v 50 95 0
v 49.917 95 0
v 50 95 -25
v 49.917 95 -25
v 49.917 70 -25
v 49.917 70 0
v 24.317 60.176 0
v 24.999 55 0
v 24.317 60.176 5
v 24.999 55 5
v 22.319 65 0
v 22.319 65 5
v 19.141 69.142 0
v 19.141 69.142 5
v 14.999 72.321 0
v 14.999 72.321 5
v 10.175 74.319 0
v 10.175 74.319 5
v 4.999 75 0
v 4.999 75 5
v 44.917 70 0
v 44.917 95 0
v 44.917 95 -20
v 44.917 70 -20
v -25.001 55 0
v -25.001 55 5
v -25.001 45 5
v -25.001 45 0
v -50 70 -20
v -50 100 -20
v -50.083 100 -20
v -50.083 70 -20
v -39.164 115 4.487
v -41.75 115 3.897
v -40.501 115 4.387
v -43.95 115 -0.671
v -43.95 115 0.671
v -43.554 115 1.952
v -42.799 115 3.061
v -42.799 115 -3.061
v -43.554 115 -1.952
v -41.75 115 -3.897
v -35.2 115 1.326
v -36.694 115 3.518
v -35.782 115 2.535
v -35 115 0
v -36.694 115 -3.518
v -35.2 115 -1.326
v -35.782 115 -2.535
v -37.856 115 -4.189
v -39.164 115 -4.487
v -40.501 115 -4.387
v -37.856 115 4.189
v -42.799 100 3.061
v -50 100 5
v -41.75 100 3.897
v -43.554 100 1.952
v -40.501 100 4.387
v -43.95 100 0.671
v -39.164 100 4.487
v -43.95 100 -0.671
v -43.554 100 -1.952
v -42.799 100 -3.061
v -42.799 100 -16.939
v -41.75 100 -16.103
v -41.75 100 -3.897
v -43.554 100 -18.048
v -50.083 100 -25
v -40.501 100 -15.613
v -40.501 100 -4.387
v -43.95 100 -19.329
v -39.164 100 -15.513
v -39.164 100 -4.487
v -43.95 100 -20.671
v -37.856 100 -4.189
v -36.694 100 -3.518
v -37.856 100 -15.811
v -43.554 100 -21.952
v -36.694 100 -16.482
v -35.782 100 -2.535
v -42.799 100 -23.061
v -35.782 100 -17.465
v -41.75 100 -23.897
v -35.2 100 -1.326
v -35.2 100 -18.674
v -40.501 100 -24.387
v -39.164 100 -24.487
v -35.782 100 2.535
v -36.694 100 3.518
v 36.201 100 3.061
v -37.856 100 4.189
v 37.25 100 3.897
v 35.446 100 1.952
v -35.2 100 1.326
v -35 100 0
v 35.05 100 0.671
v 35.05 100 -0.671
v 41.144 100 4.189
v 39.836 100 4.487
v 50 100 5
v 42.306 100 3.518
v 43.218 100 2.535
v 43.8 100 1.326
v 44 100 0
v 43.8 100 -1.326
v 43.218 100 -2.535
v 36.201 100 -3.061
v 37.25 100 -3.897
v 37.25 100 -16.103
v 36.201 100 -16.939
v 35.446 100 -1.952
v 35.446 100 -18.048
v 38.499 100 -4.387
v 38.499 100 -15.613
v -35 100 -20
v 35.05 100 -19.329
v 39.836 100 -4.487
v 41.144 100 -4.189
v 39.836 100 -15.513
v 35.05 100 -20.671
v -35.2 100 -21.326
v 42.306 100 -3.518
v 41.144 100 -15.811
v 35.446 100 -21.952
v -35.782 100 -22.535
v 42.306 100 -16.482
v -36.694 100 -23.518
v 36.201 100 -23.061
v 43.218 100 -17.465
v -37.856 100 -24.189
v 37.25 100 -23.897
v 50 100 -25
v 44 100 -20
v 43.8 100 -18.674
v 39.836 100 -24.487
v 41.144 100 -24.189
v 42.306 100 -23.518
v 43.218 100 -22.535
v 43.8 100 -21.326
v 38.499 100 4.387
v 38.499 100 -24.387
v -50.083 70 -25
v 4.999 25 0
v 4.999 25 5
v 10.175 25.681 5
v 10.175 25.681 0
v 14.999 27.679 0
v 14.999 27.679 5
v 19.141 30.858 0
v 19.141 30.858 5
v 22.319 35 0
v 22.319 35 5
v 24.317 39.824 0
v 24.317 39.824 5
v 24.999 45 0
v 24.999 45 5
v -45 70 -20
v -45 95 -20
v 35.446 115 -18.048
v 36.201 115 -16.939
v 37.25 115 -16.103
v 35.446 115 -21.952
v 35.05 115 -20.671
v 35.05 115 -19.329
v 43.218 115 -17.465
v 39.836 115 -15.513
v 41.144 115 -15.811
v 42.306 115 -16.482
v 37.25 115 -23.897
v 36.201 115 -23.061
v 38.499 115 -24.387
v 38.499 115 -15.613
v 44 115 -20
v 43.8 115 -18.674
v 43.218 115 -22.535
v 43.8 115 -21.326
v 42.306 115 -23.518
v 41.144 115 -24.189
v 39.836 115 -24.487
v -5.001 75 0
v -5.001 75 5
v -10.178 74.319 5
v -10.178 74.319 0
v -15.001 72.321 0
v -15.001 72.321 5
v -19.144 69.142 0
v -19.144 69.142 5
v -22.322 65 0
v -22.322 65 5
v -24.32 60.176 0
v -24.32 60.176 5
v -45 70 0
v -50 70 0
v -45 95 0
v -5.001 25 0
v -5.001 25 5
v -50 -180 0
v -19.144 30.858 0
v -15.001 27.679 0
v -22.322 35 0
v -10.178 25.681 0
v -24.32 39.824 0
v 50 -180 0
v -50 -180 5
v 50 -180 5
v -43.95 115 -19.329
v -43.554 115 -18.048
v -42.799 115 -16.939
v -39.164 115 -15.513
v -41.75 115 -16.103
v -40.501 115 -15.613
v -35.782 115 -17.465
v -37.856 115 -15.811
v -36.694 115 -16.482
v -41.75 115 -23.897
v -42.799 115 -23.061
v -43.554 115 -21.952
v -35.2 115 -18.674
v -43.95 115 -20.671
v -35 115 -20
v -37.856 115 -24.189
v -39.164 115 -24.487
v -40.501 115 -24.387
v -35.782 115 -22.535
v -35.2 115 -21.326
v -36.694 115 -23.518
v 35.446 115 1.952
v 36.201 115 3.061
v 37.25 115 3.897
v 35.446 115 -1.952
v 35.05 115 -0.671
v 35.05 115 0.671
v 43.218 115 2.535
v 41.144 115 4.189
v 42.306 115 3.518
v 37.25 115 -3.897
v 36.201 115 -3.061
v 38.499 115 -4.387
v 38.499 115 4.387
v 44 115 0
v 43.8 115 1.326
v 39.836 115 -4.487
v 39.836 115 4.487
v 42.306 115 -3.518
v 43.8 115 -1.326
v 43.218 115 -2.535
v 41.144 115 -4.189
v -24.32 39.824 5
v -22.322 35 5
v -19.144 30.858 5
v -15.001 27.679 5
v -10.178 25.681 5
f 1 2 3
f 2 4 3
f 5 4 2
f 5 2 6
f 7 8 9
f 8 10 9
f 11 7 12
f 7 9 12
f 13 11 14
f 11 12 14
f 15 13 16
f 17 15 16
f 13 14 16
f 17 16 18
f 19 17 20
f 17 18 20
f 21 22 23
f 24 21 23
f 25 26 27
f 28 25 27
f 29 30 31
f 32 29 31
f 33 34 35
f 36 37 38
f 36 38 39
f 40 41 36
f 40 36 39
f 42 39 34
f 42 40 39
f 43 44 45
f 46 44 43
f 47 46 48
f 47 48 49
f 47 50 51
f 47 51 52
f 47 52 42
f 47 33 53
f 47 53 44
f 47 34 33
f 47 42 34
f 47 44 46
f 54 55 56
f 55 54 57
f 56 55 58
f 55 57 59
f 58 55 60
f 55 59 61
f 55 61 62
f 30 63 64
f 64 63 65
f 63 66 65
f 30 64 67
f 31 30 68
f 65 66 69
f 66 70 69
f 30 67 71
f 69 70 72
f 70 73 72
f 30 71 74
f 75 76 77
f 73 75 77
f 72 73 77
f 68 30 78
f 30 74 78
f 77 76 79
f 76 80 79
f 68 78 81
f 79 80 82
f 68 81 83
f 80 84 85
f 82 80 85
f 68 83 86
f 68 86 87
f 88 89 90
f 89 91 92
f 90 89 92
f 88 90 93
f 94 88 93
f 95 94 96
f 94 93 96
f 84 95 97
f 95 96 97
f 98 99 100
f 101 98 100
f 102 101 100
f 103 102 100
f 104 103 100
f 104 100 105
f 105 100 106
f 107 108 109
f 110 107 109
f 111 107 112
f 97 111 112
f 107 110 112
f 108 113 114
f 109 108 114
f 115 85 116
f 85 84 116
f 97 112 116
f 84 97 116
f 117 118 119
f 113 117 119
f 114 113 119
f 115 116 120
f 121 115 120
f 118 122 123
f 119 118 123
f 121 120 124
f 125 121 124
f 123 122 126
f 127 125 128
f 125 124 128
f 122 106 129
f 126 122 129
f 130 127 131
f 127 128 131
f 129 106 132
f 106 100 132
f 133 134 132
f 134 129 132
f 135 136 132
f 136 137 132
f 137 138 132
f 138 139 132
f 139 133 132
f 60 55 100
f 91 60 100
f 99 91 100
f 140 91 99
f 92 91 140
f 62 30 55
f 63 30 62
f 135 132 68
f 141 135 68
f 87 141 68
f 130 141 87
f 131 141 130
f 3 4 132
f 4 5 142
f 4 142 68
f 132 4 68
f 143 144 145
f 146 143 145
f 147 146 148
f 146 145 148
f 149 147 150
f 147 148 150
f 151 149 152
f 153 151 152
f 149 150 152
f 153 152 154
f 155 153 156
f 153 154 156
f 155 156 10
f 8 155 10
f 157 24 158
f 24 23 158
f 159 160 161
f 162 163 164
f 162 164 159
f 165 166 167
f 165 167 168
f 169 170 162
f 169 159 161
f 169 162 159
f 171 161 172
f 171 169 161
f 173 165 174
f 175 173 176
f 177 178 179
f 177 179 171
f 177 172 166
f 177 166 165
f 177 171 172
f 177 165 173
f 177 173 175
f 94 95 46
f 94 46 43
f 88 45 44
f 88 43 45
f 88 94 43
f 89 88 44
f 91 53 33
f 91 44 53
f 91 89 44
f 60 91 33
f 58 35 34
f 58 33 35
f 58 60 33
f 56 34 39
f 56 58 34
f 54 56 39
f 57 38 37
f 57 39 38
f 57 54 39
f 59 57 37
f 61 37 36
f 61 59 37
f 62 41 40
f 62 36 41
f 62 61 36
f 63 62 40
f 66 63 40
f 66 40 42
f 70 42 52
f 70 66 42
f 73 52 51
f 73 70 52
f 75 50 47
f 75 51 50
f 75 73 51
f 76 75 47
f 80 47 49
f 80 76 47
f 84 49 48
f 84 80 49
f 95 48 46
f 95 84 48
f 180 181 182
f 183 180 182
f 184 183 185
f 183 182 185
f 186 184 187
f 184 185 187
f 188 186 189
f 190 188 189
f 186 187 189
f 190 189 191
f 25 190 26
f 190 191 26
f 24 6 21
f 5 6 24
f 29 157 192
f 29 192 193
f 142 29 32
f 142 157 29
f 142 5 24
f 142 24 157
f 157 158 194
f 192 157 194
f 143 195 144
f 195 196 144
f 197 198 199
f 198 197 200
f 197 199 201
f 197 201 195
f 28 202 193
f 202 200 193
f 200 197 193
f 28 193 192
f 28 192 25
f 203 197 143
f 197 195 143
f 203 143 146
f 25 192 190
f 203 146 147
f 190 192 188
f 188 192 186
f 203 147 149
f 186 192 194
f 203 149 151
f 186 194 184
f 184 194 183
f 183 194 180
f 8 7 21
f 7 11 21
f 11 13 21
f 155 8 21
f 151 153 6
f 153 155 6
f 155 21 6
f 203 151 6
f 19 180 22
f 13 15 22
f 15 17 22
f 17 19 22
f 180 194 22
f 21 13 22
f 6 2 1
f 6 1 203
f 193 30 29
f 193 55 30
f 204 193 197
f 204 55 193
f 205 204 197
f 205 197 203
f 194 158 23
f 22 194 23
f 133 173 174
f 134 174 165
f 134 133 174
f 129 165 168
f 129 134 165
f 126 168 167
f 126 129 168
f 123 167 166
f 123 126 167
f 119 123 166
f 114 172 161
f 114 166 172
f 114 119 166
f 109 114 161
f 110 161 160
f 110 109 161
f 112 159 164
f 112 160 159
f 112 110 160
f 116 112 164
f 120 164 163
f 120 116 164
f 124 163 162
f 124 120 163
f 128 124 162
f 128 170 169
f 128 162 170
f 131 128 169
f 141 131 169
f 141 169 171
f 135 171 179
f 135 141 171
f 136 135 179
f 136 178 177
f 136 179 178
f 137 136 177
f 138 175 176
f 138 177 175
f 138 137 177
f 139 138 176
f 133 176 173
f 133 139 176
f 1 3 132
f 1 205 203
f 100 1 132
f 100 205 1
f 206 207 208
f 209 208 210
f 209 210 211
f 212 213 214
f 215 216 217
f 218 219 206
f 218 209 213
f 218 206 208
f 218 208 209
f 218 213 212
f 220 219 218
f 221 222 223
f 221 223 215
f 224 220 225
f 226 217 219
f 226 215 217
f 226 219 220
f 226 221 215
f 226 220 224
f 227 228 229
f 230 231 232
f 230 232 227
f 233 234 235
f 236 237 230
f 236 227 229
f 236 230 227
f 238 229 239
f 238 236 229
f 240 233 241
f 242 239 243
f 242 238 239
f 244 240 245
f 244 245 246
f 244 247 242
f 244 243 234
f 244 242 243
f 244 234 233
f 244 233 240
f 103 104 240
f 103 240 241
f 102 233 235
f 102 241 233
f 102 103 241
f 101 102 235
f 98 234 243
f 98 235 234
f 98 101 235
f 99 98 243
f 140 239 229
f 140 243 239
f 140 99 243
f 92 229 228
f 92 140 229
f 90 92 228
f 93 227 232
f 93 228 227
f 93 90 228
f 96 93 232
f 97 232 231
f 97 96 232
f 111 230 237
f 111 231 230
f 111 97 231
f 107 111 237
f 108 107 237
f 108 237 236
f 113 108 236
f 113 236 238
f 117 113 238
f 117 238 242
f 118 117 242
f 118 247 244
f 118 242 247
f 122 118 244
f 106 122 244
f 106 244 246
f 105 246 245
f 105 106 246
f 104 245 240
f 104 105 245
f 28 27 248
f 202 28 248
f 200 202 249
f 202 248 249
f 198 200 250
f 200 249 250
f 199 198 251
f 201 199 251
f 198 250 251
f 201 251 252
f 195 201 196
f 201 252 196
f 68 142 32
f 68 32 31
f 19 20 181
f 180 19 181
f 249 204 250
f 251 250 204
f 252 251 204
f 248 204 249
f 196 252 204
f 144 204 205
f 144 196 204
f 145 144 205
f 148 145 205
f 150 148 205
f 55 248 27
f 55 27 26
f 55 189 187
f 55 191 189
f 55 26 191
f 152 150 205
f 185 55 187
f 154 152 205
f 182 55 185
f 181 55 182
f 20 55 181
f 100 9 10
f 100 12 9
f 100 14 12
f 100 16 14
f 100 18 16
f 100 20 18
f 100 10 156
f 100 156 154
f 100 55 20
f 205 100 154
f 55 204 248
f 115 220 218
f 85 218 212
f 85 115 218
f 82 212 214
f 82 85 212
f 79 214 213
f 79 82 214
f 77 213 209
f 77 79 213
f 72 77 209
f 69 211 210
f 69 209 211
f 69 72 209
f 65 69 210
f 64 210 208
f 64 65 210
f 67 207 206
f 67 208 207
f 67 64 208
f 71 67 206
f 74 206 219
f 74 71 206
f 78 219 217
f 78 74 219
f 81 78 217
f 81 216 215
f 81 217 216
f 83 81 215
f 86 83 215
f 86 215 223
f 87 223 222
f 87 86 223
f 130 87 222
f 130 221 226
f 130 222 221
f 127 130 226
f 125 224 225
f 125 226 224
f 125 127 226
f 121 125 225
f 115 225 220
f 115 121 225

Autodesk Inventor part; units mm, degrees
ref_plane "YZ Plane" through (0, 0, 0) normal (1, 0, 0) x (0, 1, 0)
ref_plane "XZ Plane" through (0, 0, 0) normal (0, 1, 0) x (-1, 0, 0)
ref_plane "XY Plane" through (0, 0, 0) normal (0, 0, 1) x (1, 0, 0)
sketch "Sketch1" plane through (0, 0, 0) normal (0, 0, 1) x (1, 0, 0)
  line L0 (-50, -100) -> (50, -100)
  line L1 (50, -100) -> (50, 100)
  line L2 (50, 100) -> (-50, 100)
  line L3 (-50, 100) -> (-50, -100)
  line L4 (-50, -100) -> (50, 100) construction
  line L5 (50, -100) -> (-50, 100) construction
  point P0 (0, 0)
  dimension "d0" = 100
  dimension "d1" = 200
extrude "Extrusion1" add sketch "Sketch1" along normal blind 5
sketch "Sketch6" plane through (0, 0, 5) normal (0, 0, 1) x (1, 0, 0)
  line L0 (4.9986, 75) -> (-5.0014, 75)
  line L1 (-25.0014, 55) -> (-25.0014, 45)
  line L2 (-5.0014, 25) -> (4.9986, 25)
  line L3 (24.9986, 45) -> (24.9986, 55)
  line L4 (24.9986, 75) -> (-25.0014, 25) construction
  line L5 (-25.0014, 75) -> (24.9986, 25) construction
  arc A0 (4.9986, 25) -> (24.9986, 45) centre (4.9986, 45) ccw
  arc A1 (24.9986, 55) -> (4.9986, 75) centre (4.9986, 55) ccw
  arc A2 (-5.0014, 75) -> (-25.0014, 55) centre (-5.0014, 55) ccw
  arc A3 (-25.0014, 45) -> (-5.0014, 25) centre (-5.0014, 45) ccw
  point P0 (0, 0)
  point P1 (-0.0014, 50)
  dimension "d21" = 50
  dimension "d22" = 50
  dimension "d23" = 20
extrude "Extrusion6" cut sketch "Sketch6" against normal blind 5
sketch "Sketch15" plane through (-50, 100, 5) normal (0, 1, 0) x (1, 0, 0)
  line L0 (100, 0) -> (0, 0) projected
  line L1 (0, 0) -> (100, 0)
  line L2 (100, 0) -> (100, 30)
  line L3 (100, 30) -> (0, 30)
  line L4 (0, 30) -> (0, 0)
  point P0 (50, 5)
  dimension "d46" = 100
  dimension "d47" = 30
sketch "Sketch16" plane through (-50, 100, 5) normal (0, 1, 0) x (1, 0, 0)
  circle A0 centre (10.5, 5) radius 4.5
  circle A1 centre (89.5, 5) radius 4.5
  circle A2 centre (10.5, 25) radius 4.5
  circle A3 centre (89.5, 25) radius 4.5
  point P0 (50, 5)
  dimension "d48" = 9
  dimension "d49" = 9
  dimension "d50" = 9
  dimension "d51" = 9
extrude "Extrusion11" add sketch "Sketch15" against normal blind 5
extrude "Extrusion12" add sketch "Sketch16" along normal blind 15
sketch "Sketch17" plane through (50, 100, -25) normal (0, 0, -1) x (-1, 0, 0)
  line L0 (100.0829, 0) -> (0.0829, 0)
  line L1 (0.0829, 0) -> (0.0829, -30)
  line L2 (0.0829, -30) -> (100.0829, -30)
  line L3 (100.0829, -30) -> (100.0829, 0)
  point P0 (50, -100)
  dimension "d56" = 100
  dimension "d57" = 30
extrude "Extrusion13" add sketch "Sketch17" against normal blind 5
sketch "Sketch18" plane through (49.9171, 70, -25) normal (1, 0, 0) x (0, 0, -1)
  line L0 (0, 0) -> (-5, 0) projected
  line L1 (-30, 30) -> (-30, -170) projected
  line L2 (0, 0) -> (-30, 0)
  line L3 (-30, 0) -> (-30, 30)
  line L4 (-30, 30) -> (0, 30)
  line L5 (0, 30) -> (0, 0)
  point P0 (-25, -70)
extrude "Extrusion14" add sketch "Sketch18" against normal blind 5
sketch "Sketch20" plane through (-50, -100, 5) normal (-1, 0, 0) x (0, 0, 1)
  line L0 (-30, 200) -> (0, 200) projected
  line L1 (-30, 170) -> (-30, 200) projected
  line L2 (0, 200) -> (-30, 200)
  line L3 (-30, 200) -> (-30, 170)
  line L4 (-30, 170) -> (0, 170)
  line L5 (0, 170) -> (0, 200)
  point P0 (-5, 100)
extrude "Extrusion16" add sketch "Sketch20" against normal blind 5
sketch "Sketch21" plane through (0, 0, 5) normal (0, 0, 1) x (1, 0, 0)
  line L0 (50, -100) -> (50, 100) projected
  line L1 (50, -100) -> (-50, -100)
  line L2 (-50, -100) -> (-50, -180)
  line L3 (-50, -180) -> (50, -180)
  line L4 (50, -180) -> (50, -100)
  point P0 (0, 0)
  dimension "d66" = 100
  dimension "d67" = 80
extrude "Extrusion17" add sketch "Sketch21" against normal blind 5
properties part number "fixation_v03"
